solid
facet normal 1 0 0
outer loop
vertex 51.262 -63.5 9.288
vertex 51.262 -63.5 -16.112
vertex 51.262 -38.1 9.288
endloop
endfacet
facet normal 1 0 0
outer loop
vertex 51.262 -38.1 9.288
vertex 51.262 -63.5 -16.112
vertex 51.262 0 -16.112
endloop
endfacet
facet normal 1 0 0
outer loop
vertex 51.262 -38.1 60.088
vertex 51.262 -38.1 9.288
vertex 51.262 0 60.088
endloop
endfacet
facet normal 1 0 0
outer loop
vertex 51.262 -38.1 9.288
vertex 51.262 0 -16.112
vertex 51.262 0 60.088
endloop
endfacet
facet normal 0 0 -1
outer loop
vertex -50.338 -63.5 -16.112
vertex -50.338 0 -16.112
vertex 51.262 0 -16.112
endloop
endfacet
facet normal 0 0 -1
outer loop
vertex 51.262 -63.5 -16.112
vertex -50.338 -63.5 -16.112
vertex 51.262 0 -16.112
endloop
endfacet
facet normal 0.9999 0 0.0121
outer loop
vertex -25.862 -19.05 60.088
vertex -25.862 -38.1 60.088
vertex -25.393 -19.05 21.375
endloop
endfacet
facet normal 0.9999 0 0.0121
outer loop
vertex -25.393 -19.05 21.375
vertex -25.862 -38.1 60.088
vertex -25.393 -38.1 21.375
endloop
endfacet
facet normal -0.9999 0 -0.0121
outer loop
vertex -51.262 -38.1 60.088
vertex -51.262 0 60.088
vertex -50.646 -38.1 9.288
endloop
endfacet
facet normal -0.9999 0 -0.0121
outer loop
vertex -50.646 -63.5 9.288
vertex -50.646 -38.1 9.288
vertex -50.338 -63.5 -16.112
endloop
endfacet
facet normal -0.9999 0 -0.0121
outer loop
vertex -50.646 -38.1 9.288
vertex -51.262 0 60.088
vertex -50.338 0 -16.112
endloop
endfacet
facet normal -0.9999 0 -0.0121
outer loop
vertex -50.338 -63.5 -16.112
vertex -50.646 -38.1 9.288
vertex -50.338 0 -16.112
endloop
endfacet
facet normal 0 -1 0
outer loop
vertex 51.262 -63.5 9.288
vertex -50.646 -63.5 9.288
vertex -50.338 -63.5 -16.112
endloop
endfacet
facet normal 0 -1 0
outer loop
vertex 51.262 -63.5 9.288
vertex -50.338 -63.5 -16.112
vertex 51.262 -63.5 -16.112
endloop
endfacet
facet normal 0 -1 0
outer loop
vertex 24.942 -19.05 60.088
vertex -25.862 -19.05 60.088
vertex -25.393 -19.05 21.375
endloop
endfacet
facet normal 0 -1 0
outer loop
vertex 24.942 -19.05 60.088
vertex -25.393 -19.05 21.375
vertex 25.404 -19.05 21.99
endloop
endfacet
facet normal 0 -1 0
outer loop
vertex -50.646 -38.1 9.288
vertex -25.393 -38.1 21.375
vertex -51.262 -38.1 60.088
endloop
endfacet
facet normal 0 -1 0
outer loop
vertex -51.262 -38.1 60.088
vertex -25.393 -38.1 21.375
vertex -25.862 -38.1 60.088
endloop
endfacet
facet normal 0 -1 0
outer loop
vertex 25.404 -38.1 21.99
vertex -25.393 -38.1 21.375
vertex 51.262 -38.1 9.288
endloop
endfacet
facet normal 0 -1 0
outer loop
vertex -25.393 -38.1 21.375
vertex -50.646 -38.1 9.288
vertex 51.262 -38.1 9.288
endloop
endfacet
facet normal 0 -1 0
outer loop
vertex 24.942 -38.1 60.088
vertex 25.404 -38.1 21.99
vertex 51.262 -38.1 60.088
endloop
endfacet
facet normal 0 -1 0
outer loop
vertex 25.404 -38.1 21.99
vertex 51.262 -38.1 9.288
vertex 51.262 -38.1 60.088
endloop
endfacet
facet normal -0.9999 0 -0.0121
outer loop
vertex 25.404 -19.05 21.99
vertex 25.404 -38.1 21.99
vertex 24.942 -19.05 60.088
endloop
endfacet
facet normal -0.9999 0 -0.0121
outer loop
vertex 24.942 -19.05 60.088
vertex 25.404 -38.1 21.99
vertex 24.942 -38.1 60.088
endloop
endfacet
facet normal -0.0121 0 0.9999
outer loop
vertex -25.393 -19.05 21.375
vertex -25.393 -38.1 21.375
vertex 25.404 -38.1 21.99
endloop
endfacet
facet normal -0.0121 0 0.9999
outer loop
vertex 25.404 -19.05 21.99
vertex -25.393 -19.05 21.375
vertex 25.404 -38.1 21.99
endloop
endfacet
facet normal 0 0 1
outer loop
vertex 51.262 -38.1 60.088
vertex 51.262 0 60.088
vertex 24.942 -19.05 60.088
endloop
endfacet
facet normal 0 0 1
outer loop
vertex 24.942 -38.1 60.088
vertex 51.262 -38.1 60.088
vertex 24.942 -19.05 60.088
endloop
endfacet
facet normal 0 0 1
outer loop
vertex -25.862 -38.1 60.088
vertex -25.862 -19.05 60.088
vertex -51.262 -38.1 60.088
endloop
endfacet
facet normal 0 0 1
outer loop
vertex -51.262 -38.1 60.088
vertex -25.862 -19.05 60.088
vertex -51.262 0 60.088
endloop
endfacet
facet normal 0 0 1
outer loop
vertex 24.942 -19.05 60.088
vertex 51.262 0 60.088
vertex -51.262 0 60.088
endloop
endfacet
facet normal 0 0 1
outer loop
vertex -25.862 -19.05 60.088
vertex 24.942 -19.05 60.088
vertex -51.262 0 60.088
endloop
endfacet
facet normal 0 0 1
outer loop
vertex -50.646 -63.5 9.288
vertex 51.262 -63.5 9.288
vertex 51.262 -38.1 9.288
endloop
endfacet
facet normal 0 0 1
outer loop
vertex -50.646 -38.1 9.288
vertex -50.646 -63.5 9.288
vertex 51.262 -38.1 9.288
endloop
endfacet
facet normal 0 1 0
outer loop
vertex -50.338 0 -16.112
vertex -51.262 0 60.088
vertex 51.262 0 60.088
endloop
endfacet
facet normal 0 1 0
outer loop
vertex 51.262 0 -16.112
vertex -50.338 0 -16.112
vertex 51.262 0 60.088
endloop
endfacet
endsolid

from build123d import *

# Parameters (mm, degrees)
F1_DEPTH = 63.5
F2_W     = 25.4
F2_H     = 50.8
F3_DEPTH = 104.14
F5_DEPTH = 19.05


with BuildPart() as f1:
    # F0 (on Front) → F1 (new body)
    with BuildSketch(Plane.XZ):
        Polygon((-51.261814, 60.08761), (-50.338179, -16.11239), (51.261821, -16.11239), (51.261821, 60.08761), align=None)
    extrude(amount=F1_DEPTH)

    # F2 (on face) → F3 (cut)
    with BuildSketch(Plane.YZ.offset(51.261821)):
        with Locations((-50.8, 34.68761)):
            Rectangle(F2_W, F2_H)
    extrude(amount=-F3_DEPTH, mode=Mode.SUBTRACT)

    # F4 (on face) → F5 (cut)
    with BuildSketch(Plane.XZ.offset(38.1)):
        Polygon((24.941918, 60.08761), (-25.861814, 60.08761), (-25.392567, 21.374697), (25.403702, 21.990409), align=None)
    extrude(amount=-F5_DEPTH, mode=Mode.SUBTRACT)


solid = f1.part
